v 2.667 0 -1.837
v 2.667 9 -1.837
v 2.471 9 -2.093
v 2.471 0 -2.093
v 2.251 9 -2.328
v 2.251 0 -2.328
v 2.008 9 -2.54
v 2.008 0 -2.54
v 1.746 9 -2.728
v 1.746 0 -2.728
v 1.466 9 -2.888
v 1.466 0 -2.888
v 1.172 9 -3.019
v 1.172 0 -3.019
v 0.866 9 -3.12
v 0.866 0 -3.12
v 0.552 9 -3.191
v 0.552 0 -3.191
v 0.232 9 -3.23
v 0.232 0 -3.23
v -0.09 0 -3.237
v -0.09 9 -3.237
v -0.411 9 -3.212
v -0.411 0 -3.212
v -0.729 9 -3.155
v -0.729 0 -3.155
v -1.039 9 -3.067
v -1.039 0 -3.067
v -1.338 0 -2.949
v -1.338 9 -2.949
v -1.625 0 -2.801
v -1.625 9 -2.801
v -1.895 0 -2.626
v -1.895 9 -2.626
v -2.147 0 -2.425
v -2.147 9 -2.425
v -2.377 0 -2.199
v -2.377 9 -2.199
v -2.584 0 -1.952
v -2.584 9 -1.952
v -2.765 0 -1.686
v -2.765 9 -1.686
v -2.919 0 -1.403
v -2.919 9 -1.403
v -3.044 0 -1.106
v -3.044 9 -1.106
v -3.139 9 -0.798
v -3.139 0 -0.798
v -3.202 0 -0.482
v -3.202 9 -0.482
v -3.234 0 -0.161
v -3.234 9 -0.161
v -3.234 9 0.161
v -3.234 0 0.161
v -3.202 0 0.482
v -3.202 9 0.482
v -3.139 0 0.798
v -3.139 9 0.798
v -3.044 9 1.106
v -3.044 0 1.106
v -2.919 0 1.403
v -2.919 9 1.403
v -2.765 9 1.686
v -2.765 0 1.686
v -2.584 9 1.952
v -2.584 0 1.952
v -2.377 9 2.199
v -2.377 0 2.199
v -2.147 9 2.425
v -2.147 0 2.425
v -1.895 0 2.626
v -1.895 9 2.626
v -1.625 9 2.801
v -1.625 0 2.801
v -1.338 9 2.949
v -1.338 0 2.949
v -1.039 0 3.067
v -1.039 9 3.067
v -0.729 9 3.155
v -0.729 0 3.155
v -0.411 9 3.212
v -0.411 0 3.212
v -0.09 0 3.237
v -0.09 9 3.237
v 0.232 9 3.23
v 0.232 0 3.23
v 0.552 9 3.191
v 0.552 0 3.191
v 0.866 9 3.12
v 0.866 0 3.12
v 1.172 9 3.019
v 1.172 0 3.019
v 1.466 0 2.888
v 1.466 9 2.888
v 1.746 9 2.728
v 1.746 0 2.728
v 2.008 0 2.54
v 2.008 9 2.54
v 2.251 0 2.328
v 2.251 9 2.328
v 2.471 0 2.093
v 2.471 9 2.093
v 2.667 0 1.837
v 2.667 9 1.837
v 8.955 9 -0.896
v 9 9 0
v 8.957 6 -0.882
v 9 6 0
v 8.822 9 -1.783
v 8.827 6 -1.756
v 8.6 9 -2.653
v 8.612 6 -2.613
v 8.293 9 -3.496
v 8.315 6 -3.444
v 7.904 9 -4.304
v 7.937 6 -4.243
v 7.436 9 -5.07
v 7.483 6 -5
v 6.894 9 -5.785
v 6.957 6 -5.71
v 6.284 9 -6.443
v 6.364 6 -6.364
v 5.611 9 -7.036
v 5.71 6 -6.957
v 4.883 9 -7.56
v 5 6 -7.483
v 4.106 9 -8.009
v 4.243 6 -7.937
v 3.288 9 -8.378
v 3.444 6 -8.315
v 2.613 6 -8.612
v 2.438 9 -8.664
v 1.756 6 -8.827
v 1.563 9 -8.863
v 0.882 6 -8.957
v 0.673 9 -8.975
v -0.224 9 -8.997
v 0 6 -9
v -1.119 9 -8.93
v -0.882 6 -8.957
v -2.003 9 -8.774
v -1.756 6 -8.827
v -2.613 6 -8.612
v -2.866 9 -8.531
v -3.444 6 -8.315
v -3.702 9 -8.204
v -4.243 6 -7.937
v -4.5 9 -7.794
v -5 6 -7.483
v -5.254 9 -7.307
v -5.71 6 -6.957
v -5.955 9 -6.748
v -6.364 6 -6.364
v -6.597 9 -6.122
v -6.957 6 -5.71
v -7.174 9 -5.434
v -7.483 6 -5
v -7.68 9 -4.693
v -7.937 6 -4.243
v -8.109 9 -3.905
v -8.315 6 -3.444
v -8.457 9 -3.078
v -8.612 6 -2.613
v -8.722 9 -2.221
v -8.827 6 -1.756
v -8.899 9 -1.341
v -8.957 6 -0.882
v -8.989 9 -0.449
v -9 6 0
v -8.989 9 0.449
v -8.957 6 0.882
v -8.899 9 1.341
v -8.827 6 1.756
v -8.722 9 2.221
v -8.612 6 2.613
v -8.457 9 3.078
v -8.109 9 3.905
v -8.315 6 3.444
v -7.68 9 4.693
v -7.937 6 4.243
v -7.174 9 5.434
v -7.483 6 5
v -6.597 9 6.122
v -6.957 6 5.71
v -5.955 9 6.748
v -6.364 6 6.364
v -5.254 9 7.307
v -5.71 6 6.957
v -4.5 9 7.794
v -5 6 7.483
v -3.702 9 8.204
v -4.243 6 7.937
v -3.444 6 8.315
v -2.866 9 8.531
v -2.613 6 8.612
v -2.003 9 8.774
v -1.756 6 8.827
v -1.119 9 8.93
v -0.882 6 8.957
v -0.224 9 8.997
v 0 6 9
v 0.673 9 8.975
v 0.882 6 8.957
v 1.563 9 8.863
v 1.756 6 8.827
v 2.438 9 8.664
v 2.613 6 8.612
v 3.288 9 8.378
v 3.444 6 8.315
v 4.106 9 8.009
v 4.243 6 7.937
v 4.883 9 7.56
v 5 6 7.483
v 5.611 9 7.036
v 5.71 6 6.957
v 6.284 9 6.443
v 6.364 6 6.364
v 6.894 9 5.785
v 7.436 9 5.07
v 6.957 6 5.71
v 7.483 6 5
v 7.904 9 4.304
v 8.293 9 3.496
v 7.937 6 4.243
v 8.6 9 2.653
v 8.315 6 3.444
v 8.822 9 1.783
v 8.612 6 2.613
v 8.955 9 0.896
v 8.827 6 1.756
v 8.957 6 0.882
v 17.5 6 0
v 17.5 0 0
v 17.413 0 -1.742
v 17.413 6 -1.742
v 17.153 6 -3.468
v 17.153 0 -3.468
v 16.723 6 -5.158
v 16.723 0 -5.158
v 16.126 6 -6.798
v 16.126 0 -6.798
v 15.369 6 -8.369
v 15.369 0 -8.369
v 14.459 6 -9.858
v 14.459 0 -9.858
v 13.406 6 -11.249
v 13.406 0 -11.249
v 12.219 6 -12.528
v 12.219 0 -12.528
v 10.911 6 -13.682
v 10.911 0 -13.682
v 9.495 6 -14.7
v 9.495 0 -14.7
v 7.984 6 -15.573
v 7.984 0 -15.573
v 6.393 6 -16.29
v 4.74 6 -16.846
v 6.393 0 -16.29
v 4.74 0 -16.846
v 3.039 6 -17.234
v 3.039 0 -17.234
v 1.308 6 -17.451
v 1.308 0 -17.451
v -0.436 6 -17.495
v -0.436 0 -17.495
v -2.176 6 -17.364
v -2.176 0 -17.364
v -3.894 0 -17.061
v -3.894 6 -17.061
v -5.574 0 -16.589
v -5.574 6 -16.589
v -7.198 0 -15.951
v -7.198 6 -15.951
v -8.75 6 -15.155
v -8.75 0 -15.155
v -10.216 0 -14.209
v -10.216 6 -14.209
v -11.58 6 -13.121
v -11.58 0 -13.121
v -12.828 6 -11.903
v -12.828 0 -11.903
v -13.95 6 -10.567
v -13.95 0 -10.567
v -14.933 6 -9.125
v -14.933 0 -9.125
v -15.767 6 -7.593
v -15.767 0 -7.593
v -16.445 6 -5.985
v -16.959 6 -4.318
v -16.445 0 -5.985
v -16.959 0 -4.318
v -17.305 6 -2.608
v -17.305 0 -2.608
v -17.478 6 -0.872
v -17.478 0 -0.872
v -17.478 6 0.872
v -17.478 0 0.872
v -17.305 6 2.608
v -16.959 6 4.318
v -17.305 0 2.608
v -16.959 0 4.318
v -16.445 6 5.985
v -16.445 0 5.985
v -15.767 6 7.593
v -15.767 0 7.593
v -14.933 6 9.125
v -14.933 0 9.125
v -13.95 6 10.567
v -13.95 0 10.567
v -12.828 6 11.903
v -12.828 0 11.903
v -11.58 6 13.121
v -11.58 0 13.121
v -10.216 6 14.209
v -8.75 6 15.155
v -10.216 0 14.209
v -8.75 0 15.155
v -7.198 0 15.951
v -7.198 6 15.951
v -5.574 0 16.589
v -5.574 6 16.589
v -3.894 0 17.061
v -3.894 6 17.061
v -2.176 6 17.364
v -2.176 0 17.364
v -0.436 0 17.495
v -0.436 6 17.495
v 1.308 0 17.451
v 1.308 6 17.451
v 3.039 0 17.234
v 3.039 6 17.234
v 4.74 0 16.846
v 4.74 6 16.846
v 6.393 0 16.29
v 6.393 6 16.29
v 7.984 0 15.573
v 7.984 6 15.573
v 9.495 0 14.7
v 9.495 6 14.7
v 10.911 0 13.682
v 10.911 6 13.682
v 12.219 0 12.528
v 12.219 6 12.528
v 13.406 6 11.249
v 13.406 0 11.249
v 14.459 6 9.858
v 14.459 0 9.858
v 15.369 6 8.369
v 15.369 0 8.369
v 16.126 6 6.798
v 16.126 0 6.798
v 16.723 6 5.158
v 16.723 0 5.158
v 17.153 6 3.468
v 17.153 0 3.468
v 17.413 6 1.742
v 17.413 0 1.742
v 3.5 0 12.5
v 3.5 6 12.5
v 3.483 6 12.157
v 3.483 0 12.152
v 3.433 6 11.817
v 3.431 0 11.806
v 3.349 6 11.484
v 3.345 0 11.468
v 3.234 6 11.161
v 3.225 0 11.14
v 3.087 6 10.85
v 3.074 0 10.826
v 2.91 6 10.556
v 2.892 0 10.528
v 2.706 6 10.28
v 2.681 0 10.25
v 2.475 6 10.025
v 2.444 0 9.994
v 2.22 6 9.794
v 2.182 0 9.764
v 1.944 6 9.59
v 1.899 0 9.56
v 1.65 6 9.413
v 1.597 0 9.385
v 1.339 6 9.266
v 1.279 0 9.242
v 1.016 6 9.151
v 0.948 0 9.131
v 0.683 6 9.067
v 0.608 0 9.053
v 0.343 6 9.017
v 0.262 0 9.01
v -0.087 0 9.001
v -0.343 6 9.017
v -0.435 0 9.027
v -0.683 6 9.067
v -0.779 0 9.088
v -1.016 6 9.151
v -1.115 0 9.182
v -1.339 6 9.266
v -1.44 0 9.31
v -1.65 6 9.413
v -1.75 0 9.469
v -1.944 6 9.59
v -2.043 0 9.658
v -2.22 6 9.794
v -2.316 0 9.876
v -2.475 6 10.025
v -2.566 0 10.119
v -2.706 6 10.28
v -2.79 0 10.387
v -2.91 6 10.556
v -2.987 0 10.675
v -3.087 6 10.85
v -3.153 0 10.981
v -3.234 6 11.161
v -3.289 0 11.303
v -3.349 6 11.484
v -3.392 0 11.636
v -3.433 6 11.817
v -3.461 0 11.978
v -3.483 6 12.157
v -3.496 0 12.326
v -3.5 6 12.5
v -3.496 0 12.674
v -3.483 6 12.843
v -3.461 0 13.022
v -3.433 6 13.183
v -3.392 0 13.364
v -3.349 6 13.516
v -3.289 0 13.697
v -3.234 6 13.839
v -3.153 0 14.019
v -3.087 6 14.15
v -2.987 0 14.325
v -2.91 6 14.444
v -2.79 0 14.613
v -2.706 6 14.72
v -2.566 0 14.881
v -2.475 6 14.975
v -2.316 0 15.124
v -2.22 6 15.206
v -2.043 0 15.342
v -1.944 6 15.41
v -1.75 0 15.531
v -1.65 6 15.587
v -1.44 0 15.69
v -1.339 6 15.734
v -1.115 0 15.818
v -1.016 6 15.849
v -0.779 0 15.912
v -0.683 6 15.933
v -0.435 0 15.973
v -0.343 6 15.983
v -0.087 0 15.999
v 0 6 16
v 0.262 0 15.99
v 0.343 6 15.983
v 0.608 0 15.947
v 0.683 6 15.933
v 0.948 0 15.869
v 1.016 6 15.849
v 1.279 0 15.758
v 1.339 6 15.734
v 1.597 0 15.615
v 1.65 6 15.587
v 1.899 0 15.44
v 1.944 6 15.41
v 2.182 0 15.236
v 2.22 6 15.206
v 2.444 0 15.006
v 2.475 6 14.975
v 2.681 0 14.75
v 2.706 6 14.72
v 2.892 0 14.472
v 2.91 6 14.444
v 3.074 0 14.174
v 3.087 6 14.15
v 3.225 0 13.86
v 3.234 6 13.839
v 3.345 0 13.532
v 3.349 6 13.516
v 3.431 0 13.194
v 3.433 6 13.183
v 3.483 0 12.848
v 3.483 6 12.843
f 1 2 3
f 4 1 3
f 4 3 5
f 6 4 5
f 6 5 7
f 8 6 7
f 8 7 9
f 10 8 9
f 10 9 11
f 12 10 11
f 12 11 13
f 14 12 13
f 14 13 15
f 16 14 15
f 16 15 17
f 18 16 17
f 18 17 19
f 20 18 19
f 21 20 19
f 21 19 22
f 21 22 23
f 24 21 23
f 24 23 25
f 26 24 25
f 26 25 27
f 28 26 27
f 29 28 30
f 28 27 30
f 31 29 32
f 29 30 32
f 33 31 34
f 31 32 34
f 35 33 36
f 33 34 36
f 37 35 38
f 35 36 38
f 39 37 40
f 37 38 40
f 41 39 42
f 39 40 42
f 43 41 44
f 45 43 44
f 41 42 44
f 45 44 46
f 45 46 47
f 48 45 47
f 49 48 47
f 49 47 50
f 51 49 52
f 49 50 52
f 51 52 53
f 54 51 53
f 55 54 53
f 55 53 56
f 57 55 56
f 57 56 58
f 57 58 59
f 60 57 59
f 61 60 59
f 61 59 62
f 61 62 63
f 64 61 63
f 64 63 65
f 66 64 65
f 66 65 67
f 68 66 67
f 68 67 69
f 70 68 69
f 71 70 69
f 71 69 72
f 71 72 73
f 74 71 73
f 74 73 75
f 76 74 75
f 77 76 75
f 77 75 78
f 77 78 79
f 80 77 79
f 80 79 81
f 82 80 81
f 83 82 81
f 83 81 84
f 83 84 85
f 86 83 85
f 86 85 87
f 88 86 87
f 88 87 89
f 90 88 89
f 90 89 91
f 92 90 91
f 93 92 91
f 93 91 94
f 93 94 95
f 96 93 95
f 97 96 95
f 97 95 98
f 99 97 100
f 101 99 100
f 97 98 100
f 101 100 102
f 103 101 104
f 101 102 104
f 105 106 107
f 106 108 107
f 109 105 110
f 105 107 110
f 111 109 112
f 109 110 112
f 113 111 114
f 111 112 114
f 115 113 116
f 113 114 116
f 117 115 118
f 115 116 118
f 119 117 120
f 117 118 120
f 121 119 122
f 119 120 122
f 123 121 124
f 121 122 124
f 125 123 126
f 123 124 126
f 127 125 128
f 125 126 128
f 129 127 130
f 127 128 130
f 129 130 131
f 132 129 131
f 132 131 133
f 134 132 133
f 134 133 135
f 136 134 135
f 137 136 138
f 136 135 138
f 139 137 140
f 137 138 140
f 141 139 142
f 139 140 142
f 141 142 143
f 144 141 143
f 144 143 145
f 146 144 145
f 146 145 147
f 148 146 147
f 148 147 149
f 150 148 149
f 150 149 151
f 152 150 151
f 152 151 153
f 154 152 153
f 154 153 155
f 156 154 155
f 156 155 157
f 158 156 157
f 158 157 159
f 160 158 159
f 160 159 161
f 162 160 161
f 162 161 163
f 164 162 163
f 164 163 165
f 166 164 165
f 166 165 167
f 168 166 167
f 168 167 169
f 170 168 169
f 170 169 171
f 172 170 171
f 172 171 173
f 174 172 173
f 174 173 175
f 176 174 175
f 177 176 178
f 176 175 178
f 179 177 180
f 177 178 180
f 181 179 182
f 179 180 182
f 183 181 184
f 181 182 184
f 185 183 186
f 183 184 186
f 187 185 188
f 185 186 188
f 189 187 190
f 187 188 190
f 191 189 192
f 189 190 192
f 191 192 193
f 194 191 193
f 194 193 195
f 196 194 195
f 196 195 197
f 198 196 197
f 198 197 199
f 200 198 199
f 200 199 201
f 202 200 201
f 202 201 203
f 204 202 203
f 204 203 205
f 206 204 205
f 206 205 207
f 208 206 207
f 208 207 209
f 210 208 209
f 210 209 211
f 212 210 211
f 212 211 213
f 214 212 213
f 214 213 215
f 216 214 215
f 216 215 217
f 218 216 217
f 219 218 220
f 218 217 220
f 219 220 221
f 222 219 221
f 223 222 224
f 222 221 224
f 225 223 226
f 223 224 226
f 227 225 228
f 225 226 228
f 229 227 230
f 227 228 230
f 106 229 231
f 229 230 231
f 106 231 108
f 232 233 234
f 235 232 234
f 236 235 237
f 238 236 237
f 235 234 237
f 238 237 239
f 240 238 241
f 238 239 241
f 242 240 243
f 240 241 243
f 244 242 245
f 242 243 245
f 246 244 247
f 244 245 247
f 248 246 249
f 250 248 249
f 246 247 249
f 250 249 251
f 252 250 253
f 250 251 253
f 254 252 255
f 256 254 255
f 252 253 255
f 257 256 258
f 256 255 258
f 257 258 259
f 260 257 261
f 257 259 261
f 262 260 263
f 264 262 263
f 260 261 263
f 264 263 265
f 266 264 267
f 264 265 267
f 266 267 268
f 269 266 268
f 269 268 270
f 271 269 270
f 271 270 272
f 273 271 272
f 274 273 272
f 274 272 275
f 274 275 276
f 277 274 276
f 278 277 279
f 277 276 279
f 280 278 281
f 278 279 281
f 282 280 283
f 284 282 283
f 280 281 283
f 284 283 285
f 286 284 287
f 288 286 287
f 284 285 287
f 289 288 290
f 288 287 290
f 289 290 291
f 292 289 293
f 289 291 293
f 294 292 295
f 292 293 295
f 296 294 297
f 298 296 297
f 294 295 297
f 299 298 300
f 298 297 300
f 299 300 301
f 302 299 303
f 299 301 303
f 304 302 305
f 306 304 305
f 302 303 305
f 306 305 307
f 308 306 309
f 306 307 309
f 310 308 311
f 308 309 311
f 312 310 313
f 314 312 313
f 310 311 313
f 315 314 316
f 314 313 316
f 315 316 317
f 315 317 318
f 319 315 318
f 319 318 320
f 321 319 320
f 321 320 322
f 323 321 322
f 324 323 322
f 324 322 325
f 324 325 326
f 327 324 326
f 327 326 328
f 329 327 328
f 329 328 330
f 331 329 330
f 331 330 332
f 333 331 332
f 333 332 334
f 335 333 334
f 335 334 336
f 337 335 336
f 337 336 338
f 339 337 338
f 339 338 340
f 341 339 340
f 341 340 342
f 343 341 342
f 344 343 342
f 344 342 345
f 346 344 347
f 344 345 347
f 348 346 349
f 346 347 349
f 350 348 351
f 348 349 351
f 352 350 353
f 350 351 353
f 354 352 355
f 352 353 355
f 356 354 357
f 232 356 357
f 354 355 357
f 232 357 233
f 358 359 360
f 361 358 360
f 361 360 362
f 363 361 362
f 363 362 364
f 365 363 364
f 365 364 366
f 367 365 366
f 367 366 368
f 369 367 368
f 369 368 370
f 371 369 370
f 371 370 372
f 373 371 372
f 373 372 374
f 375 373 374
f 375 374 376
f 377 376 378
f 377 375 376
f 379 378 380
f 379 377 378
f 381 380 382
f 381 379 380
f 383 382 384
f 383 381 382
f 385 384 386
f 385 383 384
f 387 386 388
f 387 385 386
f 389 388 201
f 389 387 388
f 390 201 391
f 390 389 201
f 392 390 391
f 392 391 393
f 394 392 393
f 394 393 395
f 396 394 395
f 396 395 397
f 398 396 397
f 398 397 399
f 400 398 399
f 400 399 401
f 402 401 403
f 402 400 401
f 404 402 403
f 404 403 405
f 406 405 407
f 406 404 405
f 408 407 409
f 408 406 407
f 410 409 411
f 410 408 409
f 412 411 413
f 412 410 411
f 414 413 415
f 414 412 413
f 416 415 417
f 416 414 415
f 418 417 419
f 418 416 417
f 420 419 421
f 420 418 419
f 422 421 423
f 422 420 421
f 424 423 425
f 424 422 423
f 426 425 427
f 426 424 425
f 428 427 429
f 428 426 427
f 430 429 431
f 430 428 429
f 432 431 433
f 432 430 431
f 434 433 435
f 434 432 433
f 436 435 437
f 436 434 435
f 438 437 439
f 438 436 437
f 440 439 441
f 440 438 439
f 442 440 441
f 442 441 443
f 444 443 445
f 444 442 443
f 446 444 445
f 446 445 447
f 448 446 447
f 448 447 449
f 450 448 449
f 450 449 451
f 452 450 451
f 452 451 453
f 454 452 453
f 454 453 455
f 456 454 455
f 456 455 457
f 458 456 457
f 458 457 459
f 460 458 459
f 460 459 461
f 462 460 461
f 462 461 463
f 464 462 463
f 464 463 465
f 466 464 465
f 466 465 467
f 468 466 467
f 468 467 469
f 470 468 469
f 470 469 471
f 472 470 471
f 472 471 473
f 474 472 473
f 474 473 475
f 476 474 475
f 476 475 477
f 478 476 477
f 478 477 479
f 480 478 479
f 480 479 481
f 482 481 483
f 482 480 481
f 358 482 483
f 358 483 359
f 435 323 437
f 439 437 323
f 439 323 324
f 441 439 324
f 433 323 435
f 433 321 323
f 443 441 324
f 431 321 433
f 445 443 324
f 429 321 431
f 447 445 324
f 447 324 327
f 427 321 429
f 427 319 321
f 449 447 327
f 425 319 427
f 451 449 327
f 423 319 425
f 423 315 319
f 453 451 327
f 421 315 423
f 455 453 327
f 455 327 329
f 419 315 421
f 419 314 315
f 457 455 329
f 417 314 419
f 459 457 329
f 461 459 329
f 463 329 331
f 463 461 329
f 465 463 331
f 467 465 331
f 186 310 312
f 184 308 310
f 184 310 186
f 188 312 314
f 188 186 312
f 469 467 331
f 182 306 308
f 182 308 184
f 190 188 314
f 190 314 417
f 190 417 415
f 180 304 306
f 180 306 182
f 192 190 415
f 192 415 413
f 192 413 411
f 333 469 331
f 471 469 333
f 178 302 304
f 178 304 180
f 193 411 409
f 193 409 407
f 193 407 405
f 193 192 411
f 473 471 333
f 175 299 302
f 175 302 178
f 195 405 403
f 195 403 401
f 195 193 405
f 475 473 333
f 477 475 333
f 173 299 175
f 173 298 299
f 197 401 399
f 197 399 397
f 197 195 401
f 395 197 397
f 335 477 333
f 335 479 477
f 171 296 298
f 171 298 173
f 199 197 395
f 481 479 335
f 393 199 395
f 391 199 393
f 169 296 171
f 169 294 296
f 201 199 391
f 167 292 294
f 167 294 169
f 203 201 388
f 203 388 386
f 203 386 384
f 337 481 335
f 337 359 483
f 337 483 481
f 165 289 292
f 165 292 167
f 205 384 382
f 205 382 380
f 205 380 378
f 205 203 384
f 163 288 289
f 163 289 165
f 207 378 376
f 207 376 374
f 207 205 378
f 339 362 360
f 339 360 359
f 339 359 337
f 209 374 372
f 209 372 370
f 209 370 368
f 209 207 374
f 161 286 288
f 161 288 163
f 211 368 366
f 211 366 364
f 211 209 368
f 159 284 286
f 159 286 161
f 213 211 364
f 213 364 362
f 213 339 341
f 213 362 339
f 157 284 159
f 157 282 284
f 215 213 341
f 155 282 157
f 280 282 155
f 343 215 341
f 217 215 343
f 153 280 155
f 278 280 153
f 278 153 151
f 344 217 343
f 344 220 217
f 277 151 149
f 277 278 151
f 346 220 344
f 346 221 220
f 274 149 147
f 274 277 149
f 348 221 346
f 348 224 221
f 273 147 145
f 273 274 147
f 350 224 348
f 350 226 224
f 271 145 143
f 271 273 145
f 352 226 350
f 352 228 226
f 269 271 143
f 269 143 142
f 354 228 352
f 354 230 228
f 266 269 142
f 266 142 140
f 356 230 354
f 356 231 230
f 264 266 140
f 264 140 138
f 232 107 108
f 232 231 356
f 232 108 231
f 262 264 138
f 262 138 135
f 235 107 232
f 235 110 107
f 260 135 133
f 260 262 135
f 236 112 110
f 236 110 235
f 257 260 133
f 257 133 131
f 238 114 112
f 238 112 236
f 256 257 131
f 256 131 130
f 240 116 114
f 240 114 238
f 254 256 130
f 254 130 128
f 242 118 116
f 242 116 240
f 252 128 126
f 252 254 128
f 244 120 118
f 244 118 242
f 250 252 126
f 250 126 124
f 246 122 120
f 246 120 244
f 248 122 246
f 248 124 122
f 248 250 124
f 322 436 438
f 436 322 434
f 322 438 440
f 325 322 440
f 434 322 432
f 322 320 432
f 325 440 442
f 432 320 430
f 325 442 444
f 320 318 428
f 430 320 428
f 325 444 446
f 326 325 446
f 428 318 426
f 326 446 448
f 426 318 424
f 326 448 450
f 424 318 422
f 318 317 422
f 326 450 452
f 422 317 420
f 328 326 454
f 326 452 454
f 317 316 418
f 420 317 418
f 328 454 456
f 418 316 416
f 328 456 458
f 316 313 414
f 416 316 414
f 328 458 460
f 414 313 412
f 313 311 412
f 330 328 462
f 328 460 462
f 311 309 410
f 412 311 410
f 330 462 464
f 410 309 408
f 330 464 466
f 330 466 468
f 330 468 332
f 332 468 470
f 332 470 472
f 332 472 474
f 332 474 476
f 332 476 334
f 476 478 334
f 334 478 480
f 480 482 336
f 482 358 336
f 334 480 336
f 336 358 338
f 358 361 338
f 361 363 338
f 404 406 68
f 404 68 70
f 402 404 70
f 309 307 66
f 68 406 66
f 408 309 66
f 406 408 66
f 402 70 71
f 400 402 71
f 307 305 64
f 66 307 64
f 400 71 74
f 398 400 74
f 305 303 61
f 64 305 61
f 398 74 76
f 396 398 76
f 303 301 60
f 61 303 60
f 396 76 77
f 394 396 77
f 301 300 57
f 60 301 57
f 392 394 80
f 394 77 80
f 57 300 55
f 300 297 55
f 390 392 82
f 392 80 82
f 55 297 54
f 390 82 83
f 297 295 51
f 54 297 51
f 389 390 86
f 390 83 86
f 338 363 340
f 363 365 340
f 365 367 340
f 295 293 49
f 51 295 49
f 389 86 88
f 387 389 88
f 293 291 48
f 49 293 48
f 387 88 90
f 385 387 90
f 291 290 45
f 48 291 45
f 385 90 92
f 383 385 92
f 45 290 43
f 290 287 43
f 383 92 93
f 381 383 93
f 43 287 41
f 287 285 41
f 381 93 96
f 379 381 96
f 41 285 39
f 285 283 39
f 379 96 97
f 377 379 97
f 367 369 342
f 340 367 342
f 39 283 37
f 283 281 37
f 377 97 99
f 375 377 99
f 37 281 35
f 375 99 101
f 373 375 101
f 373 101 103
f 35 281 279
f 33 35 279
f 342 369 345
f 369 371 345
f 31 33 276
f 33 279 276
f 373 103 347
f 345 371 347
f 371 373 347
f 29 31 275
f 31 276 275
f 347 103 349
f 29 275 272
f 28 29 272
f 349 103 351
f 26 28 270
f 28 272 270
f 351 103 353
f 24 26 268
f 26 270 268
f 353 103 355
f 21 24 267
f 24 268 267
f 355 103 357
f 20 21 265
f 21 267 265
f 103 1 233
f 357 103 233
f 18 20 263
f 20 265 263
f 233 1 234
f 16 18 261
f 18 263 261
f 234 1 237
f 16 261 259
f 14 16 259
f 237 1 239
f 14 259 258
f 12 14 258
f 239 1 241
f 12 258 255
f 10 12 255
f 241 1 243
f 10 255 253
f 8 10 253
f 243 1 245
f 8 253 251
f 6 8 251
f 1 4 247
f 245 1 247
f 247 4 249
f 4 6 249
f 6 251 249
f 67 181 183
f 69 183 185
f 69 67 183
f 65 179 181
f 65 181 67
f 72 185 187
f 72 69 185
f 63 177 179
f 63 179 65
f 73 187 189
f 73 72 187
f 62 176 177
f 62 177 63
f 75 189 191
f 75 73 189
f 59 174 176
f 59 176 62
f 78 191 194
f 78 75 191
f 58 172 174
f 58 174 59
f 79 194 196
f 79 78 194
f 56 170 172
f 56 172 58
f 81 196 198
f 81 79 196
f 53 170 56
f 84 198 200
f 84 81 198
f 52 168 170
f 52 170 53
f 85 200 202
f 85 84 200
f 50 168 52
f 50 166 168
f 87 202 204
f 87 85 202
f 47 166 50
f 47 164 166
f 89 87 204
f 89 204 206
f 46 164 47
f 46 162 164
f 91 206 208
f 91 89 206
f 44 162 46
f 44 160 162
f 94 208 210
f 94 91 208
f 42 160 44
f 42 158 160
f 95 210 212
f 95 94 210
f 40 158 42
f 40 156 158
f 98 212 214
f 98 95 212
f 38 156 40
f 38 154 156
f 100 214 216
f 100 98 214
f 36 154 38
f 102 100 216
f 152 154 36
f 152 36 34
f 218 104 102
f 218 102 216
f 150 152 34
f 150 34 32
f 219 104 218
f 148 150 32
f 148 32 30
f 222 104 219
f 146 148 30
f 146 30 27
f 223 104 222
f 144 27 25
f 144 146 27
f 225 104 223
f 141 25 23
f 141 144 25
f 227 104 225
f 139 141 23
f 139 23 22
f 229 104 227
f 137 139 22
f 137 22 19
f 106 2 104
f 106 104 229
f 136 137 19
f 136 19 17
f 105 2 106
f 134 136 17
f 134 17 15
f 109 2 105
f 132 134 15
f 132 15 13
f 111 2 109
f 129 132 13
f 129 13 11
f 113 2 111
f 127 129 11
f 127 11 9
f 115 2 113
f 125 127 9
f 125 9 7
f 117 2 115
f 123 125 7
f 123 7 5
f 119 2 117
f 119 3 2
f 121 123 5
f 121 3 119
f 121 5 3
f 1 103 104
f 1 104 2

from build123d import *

# Parameters (mm, degrees)
SKETCH1_R           = 17.5
BOSS_EXTRUDE1_DEPTH = 6
SKETCH3_R           = 9
BOSS_EXTRUDE2_DEPTH = 3
CUT_EXTRUDE1_DEPTH  = 10
SKETCH5_R           = 3.5
CUT_EXTRUDE2_DEPTH  = 10


with BuildPart() as part:
    # Sketch1 → Boss-Extrude1 (new body)
    with BuildSketch(Plane(origin=(0, 0, 0), x_dir=(1, 0, 0), z_dir=(0, 1, 0))):
        Circle(SKETCH1_R)
    extrude(amount=BOSS_EXTRUDE1_DEPTH)

    # Sketch3 → Boss-Extrude2 (add)
    with BuildSketch(Plane(origin=(0, 6, 0), x_dir=(1, 0, 0), z_dir=(0, 1, 0))):
        Circle(SKETCH3_R)
    extrude(amount=BOSS_EXTRUDE2_DEPTH)

    # Sketch4 → Cut-Extrude1 (cut, through all)
    with BuildSketch(Plane(origin=(0, 9, 0), x_dir=(1, 0, 0), z_dir=(0, 1, 0))):
        with BuildLine():
            Line((2.667, -1.83711547), (2.667, 1.83711547))
            ThreePointArc((2.667, 1.83711547), (-3.2385, 0), (2.667, -1.83711547))
        make_face()
    extrude(amount=-CUT_EXTRUDE1_DEPTH, mode=Mode.SUBTRACT)

    # Sketch5 → Cut-Extrude2 (cut, through all)
    with BuildSketch(Plane(origin=(0, 0, 0), x_dir=(1, 0, 0), z_dir=(0, 1, 0))):
        with Locations((0, -12.5)):
            Circle(SKETCH5_R)
    extrude(amount=CUT_EXTRUDE2_DEPTH, mode=Mode.SUBTRACT)


solid = part.part
